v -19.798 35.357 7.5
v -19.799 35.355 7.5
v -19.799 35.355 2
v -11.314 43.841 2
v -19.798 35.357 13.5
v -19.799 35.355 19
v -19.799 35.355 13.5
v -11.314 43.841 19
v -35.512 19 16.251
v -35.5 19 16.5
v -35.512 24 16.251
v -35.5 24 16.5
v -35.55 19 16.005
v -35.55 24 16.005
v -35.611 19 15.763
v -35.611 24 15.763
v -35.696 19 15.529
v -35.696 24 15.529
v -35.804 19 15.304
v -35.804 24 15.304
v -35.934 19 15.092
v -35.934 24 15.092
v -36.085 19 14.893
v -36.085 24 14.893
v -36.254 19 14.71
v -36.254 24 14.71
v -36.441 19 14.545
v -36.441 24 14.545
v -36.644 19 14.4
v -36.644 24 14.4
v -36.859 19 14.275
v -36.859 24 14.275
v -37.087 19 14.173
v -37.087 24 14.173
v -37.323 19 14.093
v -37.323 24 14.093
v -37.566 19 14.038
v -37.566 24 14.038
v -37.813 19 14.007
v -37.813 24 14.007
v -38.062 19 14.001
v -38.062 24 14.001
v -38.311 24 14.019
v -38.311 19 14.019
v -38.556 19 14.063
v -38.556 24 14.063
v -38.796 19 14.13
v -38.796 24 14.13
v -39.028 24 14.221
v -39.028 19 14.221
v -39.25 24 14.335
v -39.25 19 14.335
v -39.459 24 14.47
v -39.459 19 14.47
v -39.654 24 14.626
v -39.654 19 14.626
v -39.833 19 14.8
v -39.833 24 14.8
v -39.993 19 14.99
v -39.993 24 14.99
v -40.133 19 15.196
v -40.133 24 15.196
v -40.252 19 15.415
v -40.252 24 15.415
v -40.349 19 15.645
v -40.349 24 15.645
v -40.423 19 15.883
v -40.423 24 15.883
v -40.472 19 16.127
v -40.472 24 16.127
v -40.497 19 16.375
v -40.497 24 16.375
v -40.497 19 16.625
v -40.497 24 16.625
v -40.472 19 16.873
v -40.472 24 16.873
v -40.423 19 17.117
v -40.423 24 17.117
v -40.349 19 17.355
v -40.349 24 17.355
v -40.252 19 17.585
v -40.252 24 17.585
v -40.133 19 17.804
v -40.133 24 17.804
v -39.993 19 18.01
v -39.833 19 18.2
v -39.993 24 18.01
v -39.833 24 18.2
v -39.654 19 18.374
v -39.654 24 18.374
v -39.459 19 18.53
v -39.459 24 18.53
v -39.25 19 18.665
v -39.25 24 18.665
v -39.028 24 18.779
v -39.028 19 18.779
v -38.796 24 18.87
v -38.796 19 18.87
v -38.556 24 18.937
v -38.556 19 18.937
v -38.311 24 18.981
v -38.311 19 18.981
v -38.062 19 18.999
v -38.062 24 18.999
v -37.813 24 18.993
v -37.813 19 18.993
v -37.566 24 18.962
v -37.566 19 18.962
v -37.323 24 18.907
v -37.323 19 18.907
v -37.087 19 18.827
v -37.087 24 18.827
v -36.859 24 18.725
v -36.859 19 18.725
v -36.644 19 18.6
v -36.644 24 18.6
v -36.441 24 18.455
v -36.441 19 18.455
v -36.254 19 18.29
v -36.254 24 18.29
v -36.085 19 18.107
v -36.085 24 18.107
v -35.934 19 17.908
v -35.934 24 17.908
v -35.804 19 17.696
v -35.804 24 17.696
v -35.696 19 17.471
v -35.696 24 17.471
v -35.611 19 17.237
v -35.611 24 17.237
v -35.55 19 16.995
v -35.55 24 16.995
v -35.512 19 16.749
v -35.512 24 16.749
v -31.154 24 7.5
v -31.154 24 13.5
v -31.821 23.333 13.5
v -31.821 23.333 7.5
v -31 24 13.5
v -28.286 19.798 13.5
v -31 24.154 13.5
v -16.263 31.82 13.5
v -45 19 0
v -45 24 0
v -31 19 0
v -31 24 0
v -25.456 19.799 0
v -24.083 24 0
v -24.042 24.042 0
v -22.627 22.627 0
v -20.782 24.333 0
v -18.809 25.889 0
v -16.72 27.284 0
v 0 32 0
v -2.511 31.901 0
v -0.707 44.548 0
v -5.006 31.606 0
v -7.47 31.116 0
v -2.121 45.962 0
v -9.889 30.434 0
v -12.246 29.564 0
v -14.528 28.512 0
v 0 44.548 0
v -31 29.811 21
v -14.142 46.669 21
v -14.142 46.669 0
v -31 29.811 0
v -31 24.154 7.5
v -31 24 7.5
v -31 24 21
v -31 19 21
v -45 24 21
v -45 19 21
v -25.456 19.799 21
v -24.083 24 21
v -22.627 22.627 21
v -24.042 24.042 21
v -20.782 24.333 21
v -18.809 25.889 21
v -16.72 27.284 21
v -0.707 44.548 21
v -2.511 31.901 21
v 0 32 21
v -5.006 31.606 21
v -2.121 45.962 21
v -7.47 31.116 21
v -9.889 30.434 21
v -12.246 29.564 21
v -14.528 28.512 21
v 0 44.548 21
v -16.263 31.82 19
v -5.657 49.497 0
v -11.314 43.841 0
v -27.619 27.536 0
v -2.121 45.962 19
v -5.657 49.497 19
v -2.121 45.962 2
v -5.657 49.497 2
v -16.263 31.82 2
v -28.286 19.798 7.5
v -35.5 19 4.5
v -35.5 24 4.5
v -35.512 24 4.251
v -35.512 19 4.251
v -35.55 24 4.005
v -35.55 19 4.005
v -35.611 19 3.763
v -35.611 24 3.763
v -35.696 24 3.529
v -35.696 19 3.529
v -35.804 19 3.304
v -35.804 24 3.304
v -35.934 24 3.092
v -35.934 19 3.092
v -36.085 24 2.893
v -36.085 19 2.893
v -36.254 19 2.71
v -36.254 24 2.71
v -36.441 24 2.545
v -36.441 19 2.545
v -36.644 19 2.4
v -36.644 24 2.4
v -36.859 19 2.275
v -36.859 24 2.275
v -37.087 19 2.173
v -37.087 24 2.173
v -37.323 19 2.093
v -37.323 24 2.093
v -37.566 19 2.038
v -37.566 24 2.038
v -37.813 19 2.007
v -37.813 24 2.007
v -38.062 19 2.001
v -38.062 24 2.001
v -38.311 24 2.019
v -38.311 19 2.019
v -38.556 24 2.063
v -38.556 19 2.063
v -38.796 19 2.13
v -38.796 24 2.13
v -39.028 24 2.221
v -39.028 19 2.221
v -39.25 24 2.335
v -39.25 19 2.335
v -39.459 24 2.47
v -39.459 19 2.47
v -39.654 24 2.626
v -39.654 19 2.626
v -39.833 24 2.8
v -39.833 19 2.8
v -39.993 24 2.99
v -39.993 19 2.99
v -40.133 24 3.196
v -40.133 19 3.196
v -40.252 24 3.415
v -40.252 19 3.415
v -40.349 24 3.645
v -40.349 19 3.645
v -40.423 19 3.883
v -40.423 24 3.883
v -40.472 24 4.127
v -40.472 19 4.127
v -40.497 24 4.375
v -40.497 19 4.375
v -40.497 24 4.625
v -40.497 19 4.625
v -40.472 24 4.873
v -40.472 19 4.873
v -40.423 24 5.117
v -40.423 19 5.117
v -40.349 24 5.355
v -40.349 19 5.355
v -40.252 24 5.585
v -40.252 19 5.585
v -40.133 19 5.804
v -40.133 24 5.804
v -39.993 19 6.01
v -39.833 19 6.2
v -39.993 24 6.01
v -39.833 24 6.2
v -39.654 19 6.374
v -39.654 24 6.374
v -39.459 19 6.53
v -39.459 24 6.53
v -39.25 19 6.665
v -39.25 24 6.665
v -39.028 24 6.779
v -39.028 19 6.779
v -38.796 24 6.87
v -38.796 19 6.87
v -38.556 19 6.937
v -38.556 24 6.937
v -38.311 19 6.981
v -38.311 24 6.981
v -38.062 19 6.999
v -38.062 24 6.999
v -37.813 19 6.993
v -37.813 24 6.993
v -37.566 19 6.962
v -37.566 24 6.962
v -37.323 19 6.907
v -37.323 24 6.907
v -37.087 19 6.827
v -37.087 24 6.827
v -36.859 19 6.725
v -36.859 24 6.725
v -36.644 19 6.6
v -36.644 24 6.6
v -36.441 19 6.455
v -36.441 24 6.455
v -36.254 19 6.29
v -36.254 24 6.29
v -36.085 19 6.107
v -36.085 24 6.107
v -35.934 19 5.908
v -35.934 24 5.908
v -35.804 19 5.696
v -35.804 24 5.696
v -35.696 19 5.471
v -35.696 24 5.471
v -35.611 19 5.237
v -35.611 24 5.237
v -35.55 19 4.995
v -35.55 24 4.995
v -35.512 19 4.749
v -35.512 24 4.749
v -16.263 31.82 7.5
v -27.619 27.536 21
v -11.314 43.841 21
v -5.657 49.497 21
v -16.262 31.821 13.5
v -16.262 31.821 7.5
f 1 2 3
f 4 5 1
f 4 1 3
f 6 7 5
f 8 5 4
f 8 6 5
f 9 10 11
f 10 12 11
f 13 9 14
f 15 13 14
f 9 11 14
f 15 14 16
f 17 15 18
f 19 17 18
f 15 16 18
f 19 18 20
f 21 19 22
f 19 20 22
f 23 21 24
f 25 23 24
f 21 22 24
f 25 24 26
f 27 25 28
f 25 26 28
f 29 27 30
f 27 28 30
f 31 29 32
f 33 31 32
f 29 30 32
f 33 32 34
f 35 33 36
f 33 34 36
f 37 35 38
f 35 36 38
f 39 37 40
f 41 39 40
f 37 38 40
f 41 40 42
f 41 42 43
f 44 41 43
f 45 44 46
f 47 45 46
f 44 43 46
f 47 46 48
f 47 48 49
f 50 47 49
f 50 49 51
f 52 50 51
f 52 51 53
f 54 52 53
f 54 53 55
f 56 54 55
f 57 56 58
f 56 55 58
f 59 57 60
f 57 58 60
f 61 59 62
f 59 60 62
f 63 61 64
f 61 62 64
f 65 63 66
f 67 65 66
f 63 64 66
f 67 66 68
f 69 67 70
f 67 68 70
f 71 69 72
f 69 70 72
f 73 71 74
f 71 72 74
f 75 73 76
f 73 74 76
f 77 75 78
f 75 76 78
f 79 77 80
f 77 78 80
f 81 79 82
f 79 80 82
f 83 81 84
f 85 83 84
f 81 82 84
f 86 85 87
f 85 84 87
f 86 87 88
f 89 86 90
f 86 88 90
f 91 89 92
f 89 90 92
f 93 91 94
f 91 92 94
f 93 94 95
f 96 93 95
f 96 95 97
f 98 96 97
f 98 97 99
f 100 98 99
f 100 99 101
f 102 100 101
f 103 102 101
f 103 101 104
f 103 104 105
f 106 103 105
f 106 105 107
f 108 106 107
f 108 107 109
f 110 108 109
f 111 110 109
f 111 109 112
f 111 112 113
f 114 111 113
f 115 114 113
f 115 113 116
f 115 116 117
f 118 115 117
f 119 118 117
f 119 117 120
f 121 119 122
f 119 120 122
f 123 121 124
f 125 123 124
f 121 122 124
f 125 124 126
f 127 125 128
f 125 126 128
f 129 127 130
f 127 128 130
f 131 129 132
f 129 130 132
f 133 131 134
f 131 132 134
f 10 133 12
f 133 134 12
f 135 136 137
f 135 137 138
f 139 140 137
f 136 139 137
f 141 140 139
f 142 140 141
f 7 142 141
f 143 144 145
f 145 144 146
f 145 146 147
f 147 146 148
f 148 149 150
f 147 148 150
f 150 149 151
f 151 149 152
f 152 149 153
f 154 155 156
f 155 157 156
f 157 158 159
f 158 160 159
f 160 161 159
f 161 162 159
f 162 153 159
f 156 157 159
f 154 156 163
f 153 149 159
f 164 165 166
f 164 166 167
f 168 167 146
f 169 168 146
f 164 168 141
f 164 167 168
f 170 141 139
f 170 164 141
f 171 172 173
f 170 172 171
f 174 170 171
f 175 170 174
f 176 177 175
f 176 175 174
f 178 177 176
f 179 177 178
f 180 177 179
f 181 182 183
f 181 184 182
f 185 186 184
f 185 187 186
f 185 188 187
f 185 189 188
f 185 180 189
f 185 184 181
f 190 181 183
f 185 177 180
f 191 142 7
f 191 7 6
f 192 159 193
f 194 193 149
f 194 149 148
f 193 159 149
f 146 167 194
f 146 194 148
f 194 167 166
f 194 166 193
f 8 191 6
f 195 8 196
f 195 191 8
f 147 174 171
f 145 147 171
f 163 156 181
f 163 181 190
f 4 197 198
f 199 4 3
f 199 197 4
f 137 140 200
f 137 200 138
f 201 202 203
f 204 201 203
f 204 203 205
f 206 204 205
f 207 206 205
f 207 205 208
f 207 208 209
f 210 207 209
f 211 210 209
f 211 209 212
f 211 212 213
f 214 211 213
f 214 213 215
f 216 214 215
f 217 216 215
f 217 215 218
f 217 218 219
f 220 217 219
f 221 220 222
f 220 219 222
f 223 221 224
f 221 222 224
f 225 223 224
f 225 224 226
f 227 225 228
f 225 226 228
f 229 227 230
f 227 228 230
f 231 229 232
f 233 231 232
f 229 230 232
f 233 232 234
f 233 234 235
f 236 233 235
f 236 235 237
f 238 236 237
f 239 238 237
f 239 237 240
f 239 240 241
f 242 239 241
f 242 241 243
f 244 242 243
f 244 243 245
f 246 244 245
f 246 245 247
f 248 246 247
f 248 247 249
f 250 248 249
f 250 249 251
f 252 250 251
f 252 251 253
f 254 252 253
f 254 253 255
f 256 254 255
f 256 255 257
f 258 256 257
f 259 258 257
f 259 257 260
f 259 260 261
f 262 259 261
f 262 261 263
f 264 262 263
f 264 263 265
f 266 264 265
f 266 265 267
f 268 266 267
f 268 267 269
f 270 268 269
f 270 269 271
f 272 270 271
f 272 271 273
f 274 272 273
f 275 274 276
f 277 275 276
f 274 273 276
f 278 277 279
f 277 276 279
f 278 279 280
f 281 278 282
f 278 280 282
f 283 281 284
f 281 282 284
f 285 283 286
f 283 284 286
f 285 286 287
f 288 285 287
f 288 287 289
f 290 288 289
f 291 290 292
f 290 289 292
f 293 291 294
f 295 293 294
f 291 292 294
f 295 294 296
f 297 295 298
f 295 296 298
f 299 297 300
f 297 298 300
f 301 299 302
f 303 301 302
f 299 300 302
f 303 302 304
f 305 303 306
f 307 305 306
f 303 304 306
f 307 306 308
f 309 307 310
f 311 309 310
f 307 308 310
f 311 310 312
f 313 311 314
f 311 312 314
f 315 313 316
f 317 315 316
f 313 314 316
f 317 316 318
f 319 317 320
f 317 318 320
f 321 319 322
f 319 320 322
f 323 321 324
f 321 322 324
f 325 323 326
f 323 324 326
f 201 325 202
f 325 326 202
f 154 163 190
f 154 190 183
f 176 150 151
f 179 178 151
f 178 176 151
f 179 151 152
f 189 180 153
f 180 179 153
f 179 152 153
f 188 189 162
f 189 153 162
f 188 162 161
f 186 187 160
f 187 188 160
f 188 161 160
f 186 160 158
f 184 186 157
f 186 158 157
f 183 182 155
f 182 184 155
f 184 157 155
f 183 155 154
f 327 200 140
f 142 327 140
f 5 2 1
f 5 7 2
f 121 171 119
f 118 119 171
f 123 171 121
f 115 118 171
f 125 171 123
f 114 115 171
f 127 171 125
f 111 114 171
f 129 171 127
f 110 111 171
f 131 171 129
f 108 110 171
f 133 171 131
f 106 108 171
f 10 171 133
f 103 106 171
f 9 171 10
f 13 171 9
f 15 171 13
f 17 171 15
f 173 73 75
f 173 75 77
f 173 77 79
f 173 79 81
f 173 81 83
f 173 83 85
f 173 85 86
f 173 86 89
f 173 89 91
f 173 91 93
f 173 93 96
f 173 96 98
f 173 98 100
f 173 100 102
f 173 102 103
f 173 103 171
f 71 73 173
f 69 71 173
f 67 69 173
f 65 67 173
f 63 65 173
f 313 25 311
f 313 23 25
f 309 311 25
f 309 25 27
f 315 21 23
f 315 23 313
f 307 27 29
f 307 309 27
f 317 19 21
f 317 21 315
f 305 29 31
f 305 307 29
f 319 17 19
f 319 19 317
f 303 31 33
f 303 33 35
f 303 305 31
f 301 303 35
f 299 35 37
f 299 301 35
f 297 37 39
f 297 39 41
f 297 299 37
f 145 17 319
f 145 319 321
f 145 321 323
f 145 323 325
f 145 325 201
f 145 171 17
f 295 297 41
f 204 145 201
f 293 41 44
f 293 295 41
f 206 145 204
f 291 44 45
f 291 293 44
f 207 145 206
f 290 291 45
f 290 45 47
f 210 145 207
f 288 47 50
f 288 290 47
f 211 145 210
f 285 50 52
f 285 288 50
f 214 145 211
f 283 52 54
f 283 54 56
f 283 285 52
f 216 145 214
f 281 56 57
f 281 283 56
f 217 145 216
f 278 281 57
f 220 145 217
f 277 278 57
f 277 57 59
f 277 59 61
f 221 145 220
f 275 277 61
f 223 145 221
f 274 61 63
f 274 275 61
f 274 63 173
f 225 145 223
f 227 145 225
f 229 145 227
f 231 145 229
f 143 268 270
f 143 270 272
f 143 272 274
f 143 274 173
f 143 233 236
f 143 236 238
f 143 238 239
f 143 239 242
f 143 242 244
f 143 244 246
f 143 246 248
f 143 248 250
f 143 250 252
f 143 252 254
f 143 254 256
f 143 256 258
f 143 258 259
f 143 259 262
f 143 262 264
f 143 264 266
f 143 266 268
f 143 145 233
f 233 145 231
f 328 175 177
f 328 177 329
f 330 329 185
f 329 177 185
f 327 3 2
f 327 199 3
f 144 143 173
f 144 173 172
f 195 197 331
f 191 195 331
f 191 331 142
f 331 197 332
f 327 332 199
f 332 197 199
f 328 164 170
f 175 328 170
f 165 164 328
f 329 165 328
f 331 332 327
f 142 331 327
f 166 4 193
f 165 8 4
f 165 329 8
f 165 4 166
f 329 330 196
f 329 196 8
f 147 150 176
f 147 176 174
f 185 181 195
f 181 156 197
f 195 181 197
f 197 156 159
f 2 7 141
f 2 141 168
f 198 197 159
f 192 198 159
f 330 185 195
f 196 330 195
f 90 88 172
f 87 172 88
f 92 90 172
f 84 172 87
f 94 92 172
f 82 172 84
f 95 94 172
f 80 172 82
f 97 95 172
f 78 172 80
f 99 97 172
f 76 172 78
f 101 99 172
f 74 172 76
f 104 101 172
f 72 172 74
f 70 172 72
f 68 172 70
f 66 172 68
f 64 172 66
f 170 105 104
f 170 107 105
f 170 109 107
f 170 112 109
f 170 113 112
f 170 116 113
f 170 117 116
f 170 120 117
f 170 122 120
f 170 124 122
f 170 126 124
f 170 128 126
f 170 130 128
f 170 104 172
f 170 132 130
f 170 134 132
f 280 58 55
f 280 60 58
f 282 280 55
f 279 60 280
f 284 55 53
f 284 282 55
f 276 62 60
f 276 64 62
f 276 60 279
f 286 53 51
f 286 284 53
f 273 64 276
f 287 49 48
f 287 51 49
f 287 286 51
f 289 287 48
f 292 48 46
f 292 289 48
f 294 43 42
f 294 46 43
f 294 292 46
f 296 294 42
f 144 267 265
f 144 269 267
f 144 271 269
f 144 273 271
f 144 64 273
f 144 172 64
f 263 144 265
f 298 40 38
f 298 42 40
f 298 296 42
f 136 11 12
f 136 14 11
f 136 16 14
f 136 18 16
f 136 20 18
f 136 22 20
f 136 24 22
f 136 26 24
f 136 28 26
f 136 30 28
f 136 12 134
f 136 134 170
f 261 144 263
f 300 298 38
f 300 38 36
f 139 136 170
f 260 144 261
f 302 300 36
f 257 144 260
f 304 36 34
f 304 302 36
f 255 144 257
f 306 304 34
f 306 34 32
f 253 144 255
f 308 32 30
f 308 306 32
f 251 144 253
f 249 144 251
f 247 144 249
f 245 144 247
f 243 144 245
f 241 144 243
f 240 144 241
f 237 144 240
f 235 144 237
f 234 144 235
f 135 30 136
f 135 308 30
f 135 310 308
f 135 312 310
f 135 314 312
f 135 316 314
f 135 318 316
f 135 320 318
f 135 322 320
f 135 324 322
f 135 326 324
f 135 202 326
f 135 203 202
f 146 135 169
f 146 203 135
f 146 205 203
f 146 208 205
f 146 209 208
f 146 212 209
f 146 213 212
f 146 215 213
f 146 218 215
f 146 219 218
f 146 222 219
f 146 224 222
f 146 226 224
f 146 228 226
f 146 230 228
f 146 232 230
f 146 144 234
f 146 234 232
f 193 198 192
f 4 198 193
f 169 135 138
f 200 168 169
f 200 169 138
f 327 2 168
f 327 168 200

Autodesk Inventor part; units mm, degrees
ref_plane "YZ Plane" through (0, 0, 0) normal (1, 0, 0) x (0, 1, 0)
ref_plane "XZ Plane" through (0, 0, 0) normal (0, 1, 0) x (-1, 0, 0)
ref_plane "XY Plane" through (0, 0, 0) normal (0, 0, 1) x (1, 0, 0)
sketch "Sketch1" plane through (0, 0, 0) normal (0, 0, 1) x (1, 0, 0)
  line L0 (0, 0) -> (-22.6274, 22.6274) construction
  circle A0 centre (0, 0) radius 32 construction
  line L1 (-31, 0) -> (-45, 0) construction
  line L2 (-45, 0) -> (-45, 19) construction
  line L3 (-45, 19) -> (-31, 19) construction
  line L4 (-31, 19) -> (-31, 0) construction
  line L5 (-31, 0) -> (0, 0) construction
  circle A1 centre (0, 0) radius 30 construction
  line L6 (-22.6274, 22.6274) -> (-0.7071, 44.5477)
  line L7 (-0.7071, 44.5477) -> (-2.1213, 45.9619)
  line L8 (-2.1213, 45.9619) -> (-24.0416, 24.0416)
  line L9 (-24.0416, 24.0416) -> (-22.6274, 22.6274)
  line L10 (-24.0416, 24.0416) -> (-22.6274, 22.6274)
  line L11 (-22.6274, 22.6274) -> (-25.4558, 19.799)
  line L12 (-25.4558, 19.799) -> (-26.8701, 21.2132)
  line L13 (-26.8701, 21.2132) -> (-24.0416, 24.0416)
  line L14 (-25.4558, 19.799) -> (-31, 19)
  line L15 (-31, 19) -> (-45, 19)
  line L16 (-45, 19) -> (-45, 24)
  line L17 (-45, 24) -> (-24.0833, 24)
  line L18 (-26.8701, 21.2132) -> (-24.0833, 24)
  line L19 (-0.7071, 44.5477) -> (0, 44.5477)
  line L20 (0, 44.5477) -> (0, 32)
  arc A2 (0, 32) -> (-22.6274, 22.6274) centre (0, 0) ccw
  point P0 (0, 38.2739)
  dimension "d0" = 19
  dimension "d1" = 31
  dimension "d2" = 14
  dimension "d4" = 60
  dimension "d5" = 2
  dimension "d6" = 2
  dimension "d8" = 4
  dimension "d9" = 35
  dimension "d10" = 45
  dimension "d13" = 5
extrude "Extrusion1" add sketch "Sketch1" along normal blind 21
sketch "Sketch2" plane through (-24.0833, 24, 0) normal (-0.7071068, 0.7071068, 0) x (-0.7071068, -0.7071068, 0)
  line L0 (-31.0589, 0) -> (-31.0589, 21) construction
  line L1 (-31.0589, 2) -> (-11.0589, 2)
  line L2 (-11.0589, 2) -> (-11.0589, 19)
  line L3 (-11.0589, 19) -> (-31.0589, 19)
  line L4 (-31.0589, 19) -> (-31.0589, 2)
  line L5 (-31.0589, 0) -> (0, 0) construction
  line L6 (-31.0589, 21) -> (0, 21) construction
  line L7 (-31.0589, 2) -> (-31.0589, 0)
  line L8 (0, 0) -> (0, 21) projected
  line L9 (-31.0589, 0) -> (0, 0)
  line L10 (0, 0) -> (0, 21)
  line L11 (0, 21) -> (-31.0589, 21)
  line L12 (-31.0589, 21) -> (-31.0589, 19)
  point P0 (-0.0589, 0)
  point P1 (-31.0589, 10.5)
  dimension "d14" = 17
  dimension "d15" = 20
extrude "Extrusion2" add sketch "Sketch2" along normal blind 5 contours L1 L2 L3 L12 L11 L8 L9 L7
sketch "Sketch3" plane through (-16.2635, 31.8198, 2) normal (0.7071068, 0.7071068, 0) x (-0.7071068, 0.7071068, 0)
  line L0 (0, 0) -> (0, 17) construction
  line L1 (0, 0) -> (5, 0) construction
  line L2 (5, 17) -> (5, 0) construction
  line L3 (0, 17) -> (5, 17) construction
  line L4 (5, 5.5) -> (0, 5.5)
  line L5 (0, 5.5) -> (0, 11.5)
  line L6 (0, 11.5) -> (5, 11.5)
  line L7 (5, 11.5) -> (5, 5.5)
  line L8 (0, 0) -> (0, 17) projected
  point P0 (-34, -2)
  point P1 (5, 8.5)
  point P2 (0, 8.5)
  dimension "d18" = 6
sketch "Sketch4" plane through (0, 0, 21) normal (0, 0, 1) x (1, 0, 0)
  line L0 (-24.0833, 24) -> (-45, 24) projected
  line L1 (-45, 24) -> (-45, 19) projected
  line L2 (-45, 19) -> (-31, 19) projected
  line L3 (-31, 19) -> (-25.4558, 19.799) projected
  line L4 (-25.4558, 19.799) -> (-22.6274, 22.6274) projected
  line L5 (-0.7071, 44.5477) -> (-5.6569, 49.4975) projected
  line L6 (-27.6188, 27.5355) -> (-5.6569, 49.4975) projected
  line L7 (-24.0833, 24) -> (-27.6188, 27.5355) projected
  line L8 (-11.3137, 43.8406) -> (-14.1421, 46.669)
  line L9 (-14.1421, 46.669) -> (-31, 29.8112)
  line L10 (-31, 29.8112) -> (-31, 24)
  arc A0 (0, 32) -> (-22.6274, 22.6274) centre (0, 0) ccw projected
  line L11 (0, 32) -> (0, 44.5477) projected
  line L12 (0, 44.5477) -> (-0.7071, 44.5477) projected
  dimension "d19" = 8
  dimension "d20" = 4
extrude "Extrusion3" add sketch "Sketch4" against normal up to surface (21 mm away) contours L0 L10 L9 L8 L6 L7
extrude "Extrusion4" cut sketch "Sketch3" against normal blind 17
sketch "Sketch5" plane through (-45, 24, 21) normal (0, 1, 0) x (1, 0, 0)
  line L0 (14, 0) -> (14, 7.5) construction
  line L1 (14, 21) -> (0, 21) construction
  line L2 (0, 21) -> (0, 0) construction
  line L3 (14, 0) -> (0, 0) construction
  line L4 (0, 21) -> (0, 0) construction
  line L5 (0, 10.5) -> (14, 10.5) construction
  line L6 (14, 0) -> (14, 21) construction
  line L7 (7, 16.5) -> (7, 4.5) construction
  circle A0 centre (7, 16.5) radius 2.5
  circle A1 centre (7, 4.5) radius 2.5
  line L8 (13.8457, 13.5) -> (14, 13.5) projected
  line L9 (14, 13.5) -> (14, 21) projected
  line L10 (14, 7.5) -> (13.8457, 7.5) projected
  line L11 (13.8457, 7.5) -> (13.8457, 13.5) projected
  point P0 (45, 21)
  point P1 (7, 10.5)
  dimension "d25" = 5
  dimension "d26" = 12
extrude "Extrusion5" cut sketch "Sketch5" against normal through all
properties part number "hall follower"
